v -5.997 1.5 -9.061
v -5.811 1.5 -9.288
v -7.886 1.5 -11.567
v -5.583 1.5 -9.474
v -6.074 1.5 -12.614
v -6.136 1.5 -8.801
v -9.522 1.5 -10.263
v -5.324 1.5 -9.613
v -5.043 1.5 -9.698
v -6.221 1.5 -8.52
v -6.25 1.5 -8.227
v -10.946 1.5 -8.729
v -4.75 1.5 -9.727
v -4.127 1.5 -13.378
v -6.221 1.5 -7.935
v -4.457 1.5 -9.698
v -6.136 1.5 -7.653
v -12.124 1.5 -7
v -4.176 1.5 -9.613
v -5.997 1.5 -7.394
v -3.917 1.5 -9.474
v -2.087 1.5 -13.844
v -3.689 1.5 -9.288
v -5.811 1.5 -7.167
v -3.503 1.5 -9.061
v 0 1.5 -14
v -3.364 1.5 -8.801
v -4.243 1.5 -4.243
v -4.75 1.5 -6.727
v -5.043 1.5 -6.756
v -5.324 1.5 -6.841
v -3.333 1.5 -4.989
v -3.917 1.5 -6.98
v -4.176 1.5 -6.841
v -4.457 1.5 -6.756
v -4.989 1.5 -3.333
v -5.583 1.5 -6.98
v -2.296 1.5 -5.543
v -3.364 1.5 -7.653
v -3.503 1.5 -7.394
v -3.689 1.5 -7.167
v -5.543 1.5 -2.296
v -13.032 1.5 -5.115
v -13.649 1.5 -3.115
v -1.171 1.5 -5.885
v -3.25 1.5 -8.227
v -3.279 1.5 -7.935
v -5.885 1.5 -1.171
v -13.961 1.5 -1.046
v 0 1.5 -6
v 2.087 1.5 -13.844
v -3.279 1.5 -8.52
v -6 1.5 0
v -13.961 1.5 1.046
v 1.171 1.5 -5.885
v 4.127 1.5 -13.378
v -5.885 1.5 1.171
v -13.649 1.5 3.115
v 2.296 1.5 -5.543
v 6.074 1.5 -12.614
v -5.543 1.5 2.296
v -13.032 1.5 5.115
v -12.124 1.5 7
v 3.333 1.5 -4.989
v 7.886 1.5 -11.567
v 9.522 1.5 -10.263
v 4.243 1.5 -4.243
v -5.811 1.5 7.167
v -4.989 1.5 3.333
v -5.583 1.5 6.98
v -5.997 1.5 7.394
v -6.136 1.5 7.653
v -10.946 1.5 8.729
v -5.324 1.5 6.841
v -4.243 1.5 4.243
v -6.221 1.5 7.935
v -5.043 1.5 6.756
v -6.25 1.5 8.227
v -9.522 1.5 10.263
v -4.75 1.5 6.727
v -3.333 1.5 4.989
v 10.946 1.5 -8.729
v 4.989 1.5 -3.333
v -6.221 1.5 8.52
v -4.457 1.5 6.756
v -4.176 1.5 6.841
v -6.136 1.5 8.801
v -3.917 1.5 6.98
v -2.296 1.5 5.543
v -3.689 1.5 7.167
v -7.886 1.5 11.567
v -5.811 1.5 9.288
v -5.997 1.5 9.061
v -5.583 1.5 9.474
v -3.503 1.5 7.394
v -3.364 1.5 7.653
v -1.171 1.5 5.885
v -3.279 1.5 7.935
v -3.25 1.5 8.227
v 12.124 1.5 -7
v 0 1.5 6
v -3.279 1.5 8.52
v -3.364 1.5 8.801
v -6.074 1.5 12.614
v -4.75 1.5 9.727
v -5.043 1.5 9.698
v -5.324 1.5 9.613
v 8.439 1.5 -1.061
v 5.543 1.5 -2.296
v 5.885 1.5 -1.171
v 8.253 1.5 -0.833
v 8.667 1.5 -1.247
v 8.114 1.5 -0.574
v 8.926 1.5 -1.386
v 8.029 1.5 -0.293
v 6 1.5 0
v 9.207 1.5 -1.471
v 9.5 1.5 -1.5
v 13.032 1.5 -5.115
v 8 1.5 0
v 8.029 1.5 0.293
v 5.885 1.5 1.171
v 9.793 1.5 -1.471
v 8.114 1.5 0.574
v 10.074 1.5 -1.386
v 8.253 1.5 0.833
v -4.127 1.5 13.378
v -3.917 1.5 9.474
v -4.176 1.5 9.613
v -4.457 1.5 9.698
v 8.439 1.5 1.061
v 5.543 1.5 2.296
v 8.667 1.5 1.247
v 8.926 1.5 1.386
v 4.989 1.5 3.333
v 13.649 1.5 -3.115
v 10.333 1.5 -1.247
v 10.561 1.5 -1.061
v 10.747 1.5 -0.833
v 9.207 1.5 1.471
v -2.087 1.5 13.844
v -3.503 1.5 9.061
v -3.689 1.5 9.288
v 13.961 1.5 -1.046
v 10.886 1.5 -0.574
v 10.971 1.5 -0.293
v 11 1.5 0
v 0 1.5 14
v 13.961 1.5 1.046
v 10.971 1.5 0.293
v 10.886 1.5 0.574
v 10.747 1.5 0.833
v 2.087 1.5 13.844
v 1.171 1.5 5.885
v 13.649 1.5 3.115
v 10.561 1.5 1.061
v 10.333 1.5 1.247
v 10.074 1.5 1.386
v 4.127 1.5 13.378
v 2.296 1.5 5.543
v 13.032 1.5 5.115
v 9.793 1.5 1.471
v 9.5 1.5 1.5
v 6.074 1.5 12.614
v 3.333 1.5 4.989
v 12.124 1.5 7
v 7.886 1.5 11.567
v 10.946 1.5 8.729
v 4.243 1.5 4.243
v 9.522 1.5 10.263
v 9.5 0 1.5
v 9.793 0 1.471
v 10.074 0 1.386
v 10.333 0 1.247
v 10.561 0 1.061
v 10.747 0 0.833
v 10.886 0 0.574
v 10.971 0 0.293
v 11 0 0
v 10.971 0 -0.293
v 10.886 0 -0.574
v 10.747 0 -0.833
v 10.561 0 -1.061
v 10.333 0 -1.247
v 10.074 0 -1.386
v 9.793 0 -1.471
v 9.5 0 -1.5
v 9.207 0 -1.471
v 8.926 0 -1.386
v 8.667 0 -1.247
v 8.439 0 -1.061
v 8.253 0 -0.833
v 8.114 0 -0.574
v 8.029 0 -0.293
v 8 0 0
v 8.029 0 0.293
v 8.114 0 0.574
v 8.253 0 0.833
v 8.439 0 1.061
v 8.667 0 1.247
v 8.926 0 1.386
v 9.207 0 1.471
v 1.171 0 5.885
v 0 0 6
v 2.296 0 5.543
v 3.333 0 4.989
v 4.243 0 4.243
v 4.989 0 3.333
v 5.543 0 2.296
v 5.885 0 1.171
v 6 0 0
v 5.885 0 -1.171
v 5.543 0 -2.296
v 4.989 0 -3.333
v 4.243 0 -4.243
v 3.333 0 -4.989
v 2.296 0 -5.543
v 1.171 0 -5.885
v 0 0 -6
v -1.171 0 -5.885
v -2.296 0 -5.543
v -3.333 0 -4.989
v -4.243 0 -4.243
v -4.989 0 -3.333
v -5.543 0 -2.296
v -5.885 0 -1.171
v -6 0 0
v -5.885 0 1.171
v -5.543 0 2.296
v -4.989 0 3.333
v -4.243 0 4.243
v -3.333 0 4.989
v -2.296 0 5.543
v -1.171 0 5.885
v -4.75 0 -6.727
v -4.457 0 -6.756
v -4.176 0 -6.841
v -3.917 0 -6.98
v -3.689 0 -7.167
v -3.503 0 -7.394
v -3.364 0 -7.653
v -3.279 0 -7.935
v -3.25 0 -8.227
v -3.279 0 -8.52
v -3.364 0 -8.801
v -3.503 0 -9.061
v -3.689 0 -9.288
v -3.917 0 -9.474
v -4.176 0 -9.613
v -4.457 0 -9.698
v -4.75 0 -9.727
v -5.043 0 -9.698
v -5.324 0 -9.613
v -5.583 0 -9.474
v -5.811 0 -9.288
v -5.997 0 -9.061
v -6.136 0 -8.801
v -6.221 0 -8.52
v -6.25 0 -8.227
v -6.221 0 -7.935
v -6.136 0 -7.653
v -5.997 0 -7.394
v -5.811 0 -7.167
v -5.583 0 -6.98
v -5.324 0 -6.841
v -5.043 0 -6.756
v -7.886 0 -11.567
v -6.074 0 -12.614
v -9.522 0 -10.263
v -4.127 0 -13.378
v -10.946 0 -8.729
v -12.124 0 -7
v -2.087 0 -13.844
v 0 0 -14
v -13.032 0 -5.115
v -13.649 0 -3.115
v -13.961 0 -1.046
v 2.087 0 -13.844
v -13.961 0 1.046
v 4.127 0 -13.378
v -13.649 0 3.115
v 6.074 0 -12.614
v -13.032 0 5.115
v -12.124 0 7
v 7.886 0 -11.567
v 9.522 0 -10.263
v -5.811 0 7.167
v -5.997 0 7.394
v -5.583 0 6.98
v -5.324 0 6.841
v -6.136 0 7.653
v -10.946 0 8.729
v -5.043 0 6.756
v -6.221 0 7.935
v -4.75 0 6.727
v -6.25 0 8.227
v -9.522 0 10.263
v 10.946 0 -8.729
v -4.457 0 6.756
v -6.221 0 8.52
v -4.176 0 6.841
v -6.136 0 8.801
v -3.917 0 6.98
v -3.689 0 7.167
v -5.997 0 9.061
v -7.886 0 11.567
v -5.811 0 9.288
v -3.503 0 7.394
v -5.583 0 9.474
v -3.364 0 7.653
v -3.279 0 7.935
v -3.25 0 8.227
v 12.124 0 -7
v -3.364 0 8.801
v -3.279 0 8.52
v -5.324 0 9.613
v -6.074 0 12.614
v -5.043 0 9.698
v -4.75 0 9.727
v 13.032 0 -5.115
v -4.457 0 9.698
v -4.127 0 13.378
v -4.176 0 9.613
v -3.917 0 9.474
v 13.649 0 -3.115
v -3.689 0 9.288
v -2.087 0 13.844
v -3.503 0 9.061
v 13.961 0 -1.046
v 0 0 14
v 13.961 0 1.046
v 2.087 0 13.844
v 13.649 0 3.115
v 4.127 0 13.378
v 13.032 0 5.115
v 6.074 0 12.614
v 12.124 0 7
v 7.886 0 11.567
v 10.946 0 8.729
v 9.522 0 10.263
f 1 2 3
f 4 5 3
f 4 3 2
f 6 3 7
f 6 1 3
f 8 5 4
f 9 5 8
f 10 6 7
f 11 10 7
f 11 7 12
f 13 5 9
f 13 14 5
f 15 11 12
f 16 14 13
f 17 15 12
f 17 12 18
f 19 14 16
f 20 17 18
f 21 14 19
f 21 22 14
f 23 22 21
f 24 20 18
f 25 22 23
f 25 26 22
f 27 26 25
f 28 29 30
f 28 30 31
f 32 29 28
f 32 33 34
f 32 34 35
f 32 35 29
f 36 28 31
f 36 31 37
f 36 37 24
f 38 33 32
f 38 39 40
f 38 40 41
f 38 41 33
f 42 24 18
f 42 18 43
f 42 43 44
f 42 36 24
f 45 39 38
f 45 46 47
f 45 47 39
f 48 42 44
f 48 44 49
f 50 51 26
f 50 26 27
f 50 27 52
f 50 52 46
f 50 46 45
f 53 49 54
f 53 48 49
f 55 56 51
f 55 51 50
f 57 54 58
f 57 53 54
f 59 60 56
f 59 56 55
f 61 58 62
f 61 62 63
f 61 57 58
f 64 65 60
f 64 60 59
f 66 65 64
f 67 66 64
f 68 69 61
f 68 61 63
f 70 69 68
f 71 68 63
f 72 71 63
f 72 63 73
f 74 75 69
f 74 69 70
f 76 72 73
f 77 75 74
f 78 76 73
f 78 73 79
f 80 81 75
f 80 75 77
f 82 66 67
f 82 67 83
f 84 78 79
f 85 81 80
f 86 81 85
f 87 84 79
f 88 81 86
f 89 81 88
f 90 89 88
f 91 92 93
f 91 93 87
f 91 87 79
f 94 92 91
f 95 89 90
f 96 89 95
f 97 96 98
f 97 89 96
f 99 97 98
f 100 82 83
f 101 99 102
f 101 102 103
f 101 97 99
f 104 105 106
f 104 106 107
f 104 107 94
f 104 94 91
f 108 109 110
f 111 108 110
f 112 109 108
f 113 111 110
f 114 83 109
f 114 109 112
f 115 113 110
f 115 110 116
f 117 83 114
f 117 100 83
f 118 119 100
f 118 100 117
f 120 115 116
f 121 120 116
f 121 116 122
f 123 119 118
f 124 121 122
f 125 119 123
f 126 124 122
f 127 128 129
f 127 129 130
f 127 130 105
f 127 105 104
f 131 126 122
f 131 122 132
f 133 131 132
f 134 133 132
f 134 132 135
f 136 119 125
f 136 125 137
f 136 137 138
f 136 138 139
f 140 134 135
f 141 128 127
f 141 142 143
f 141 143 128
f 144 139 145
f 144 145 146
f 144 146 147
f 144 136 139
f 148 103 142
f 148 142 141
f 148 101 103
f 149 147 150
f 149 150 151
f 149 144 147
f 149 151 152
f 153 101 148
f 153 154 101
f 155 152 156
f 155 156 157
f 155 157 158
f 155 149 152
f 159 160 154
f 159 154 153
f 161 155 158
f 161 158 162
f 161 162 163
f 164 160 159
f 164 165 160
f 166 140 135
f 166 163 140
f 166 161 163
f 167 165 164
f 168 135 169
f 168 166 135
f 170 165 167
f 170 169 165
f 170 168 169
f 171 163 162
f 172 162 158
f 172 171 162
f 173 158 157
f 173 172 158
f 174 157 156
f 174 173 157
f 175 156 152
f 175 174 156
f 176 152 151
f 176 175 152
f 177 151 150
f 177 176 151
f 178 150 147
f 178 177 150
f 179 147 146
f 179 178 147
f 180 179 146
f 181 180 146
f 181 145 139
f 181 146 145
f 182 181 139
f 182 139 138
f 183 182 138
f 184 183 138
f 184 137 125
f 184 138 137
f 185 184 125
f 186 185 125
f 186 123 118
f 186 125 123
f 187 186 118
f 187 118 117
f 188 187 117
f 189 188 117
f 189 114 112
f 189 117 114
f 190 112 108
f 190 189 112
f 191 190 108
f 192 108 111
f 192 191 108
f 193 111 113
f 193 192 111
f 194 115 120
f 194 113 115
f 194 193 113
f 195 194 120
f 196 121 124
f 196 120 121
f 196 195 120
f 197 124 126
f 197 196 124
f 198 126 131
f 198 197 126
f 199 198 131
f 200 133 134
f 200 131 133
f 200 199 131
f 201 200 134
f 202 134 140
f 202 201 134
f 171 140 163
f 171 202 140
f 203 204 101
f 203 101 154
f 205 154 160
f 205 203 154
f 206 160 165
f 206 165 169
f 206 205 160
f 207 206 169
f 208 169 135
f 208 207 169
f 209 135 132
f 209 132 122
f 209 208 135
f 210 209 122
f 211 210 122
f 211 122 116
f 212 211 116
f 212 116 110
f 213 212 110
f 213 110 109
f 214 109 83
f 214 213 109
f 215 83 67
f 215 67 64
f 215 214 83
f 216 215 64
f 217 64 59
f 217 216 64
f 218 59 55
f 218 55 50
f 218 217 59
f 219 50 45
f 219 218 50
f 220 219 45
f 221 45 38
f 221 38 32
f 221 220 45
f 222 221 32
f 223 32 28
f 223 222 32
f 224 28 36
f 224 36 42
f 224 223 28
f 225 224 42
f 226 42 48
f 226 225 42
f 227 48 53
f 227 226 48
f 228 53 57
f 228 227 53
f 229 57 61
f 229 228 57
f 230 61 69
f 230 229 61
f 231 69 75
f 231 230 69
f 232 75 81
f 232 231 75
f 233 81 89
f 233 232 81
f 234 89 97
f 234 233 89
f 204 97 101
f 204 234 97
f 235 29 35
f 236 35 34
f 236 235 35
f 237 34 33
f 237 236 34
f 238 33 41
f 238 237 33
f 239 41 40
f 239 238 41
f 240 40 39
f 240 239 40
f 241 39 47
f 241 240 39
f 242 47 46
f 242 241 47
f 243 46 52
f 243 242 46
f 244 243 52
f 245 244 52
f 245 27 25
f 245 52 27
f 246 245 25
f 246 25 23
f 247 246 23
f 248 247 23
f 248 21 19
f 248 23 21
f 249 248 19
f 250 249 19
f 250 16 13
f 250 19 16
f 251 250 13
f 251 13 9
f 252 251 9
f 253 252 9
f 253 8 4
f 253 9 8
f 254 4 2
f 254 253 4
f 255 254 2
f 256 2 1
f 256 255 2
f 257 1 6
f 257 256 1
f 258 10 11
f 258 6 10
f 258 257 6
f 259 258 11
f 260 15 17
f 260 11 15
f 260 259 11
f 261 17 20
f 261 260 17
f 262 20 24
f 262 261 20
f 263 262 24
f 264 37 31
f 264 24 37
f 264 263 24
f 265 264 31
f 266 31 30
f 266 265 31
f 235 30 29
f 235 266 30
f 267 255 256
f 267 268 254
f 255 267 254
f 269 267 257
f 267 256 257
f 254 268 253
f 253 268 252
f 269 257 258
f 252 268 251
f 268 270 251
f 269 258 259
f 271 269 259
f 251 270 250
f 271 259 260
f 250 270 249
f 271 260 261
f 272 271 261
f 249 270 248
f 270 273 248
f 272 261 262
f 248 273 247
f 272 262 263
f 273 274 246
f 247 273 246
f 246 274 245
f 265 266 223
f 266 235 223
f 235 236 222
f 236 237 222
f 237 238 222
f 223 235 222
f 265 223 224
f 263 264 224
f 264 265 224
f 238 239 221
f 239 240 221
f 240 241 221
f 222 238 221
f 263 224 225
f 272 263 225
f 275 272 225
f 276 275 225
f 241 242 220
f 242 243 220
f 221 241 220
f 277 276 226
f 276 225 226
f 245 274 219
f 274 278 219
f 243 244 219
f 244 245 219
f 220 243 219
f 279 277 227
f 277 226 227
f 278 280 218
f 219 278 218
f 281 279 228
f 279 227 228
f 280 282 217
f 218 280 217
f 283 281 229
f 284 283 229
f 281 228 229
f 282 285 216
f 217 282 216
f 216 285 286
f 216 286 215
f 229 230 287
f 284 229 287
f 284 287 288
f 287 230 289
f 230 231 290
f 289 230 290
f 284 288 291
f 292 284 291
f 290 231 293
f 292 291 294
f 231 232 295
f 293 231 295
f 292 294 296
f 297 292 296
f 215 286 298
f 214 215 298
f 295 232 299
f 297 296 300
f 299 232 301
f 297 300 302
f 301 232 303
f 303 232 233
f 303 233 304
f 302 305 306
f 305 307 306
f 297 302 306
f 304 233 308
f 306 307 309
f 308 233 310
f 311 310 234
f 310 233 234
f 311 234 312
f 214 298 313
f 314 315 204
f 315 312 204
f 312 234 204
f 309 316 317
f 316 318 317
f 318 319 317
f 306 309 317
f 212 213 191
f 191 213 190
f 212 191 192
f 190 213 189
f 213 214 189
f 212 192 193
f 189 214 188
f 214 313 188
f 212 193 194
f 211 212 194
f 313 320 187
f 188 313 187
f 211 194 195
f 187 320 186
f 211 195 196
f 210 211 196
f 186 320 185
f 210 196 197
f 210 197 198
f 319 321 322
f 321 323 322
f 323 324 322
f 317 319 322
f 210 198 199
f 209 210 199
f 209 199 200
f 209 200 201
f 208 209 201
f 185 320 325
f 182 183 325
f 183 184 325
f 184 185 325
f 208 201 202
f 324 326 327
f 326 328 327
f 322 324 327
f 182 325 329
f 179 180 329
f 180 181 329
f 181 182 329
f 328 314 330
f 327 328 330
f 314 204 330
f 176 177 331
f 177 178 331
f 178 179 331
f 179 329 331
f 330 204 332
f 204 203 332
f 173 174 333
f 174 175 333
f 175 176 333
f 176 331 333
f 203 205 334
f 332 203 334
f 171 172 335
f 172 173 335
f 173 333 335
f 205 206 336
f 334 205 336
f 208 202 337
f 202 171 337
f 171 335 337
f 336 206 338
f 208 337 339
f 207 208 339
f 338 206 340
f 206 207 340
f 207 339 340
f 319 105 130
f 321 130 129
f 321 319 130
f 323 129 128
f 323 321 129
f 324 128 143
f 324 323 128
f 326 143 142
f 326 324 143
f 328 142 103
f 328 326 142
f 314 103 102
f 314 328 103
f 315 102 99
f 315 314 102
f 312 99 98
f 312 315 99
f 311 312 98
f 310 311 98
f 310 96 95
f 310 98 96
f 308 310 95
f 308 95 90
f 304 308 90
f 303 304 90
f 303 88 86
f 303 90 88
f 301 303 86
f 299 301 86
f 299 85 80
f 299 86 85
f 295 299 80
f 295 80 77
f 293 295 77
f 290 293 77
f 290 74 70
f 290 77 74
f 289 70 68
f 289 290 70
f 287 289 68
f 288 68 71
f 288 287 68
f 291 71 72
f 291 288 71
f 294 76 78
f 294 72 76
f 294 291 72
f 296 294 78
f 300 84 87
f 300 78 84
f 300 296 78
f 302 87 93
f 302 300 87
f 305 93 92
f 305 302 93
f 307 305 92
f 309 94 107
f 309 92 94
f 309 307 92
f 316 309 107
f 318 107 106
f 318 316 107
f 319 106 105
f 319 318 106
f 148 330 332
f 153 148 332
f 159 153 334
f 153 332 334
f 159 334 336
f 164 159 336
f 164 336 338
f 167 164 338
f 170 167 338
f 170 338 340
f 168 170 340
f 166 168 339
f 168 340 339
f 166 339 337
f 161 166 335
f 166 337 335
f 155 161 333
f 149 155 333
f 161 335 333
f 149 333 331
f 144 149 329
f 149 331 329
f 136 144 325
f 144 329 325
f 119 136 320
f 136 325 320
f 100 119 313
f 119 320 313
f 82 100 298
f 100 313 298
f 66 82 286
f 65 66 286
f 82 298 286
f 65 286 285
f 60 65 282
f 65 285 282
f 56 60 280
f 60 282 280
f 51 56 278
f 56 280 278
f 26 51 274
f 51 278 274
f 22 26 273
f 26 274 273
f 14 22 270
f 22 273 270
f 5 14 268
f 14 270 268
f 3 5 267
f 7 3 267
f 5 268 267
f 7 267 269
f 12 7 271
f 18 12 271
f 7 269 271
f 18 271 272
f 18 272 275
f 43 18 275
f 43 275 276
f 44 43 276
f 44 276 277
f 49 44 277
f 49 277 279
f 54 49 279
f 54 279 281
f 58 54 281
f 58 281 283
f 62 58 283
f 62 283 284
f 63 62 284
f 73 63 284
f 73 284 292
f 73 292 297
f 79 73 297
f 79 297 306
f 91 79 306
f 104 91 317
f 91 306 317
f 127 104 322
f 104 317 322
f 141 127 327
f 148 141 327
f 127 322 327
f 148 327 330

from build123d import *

# Parameters (mm, degrees)
SKETCH_1_R          = 14
SKETCH_1_R_2        = 6
EXTRUDE_1_DEPTH     = 1.5
CUT_EXTRUDE_2_REACH = 21.856
SKETCH_2_R          = 1.5


with BuildPart() as part:
    # 草图1 → 凸台-拉伸1 (new body)
    with BuildSketch(Plane(origin=(0, 0, 0), x_dir=(1, 0, 0), z_dir=(0, 1, 0))):
        with Locations(Location((0, 0, 0), (0, 0, 270))):
            Circle(SKETCH_1_R)
        with Locations(Location((0, 0, 0), (0, 0, 270))):
            Circle(SKETCH_1_R_2, mode=Mode.SUBTRACT)
    extrude(amount=EXTRUDE_1_DEPTH)

    # 草图2 → 切除-拉伸2 (cut, up to next)
    with BuildSketch(Plane(origin=(0, 0, 0), x_dir=(1, 0, 0), z_dir=(0, 1, 0)), mode=Mode.PRIVATE) as cut_extrude_2_sk1:
        with Locations(Location((9.5, 0, 0), (0, 0, 270))):
            Circle(SKETCH_2_R)
    cut_extrude_2_tool1 = extrude(cut_extrude_2_sk1.sketch, amount=CUT_EXTRUDE_2_REACH, mode=Mode.PRIVATE) & part.part
    # 草图2 → 切除-拉伸2 (cut, up to next)
    with BuildSketch(Plane(origin=(0, 0, 0), x_dir=(1, 0, 0), z_dir=(0, 1, 0)), mode=Mode.PRIVATE) as cut_extrude_2_sk2:
        with Locations(Location((-4.75, -8.227241336, 0), (0, 0, 270))):
            Circle(SKETCH_2_R)
    cut_extrude_2_tool2 = extrude(cut_extrude_2_sk2.sketch, amount=CUT_EXTRUDE_2_REACH, mode=Mode.PRIVATE) & part.part
    # 草图2 → 切除-拉伸2 (cut, up to next)
    with BuildSketch(Plane(origin=(0, 0, 0), x_dir=(1, 0, 0), z_dir=(0, 1, 0)), mode=Mode.PRIVATE) as cut_extrude_2_sk3:
        with Locations(Location((-4.75, 8.227241336, 0), (0, 0, 270))):
            Circle(SKETCH_2_R)
    cut_extrude_2_tool3 = extrude(cut_extrude_2_sk3.sketch, amount=CUT_EXTRUDE_2_REACH, mode=Mode.PRIVATE) & part.part
    add(cut_extrude_2_tool1.solids().sort_by_distance((9.5, 0, 0))[0], mode=Mode.SUBTRACT)
    add(cut_extrude_2_tool2.solids().sort_by_distance((-4.75, 0, 8.227241))[0], mode=Mode.SUBTRACT)
    add(cut_extrude_2_tool3.solids().sort_by_distance((-4.75, 0, -8.227241))[0], mode=Mode.SUBTRACT)


solid = part.part
